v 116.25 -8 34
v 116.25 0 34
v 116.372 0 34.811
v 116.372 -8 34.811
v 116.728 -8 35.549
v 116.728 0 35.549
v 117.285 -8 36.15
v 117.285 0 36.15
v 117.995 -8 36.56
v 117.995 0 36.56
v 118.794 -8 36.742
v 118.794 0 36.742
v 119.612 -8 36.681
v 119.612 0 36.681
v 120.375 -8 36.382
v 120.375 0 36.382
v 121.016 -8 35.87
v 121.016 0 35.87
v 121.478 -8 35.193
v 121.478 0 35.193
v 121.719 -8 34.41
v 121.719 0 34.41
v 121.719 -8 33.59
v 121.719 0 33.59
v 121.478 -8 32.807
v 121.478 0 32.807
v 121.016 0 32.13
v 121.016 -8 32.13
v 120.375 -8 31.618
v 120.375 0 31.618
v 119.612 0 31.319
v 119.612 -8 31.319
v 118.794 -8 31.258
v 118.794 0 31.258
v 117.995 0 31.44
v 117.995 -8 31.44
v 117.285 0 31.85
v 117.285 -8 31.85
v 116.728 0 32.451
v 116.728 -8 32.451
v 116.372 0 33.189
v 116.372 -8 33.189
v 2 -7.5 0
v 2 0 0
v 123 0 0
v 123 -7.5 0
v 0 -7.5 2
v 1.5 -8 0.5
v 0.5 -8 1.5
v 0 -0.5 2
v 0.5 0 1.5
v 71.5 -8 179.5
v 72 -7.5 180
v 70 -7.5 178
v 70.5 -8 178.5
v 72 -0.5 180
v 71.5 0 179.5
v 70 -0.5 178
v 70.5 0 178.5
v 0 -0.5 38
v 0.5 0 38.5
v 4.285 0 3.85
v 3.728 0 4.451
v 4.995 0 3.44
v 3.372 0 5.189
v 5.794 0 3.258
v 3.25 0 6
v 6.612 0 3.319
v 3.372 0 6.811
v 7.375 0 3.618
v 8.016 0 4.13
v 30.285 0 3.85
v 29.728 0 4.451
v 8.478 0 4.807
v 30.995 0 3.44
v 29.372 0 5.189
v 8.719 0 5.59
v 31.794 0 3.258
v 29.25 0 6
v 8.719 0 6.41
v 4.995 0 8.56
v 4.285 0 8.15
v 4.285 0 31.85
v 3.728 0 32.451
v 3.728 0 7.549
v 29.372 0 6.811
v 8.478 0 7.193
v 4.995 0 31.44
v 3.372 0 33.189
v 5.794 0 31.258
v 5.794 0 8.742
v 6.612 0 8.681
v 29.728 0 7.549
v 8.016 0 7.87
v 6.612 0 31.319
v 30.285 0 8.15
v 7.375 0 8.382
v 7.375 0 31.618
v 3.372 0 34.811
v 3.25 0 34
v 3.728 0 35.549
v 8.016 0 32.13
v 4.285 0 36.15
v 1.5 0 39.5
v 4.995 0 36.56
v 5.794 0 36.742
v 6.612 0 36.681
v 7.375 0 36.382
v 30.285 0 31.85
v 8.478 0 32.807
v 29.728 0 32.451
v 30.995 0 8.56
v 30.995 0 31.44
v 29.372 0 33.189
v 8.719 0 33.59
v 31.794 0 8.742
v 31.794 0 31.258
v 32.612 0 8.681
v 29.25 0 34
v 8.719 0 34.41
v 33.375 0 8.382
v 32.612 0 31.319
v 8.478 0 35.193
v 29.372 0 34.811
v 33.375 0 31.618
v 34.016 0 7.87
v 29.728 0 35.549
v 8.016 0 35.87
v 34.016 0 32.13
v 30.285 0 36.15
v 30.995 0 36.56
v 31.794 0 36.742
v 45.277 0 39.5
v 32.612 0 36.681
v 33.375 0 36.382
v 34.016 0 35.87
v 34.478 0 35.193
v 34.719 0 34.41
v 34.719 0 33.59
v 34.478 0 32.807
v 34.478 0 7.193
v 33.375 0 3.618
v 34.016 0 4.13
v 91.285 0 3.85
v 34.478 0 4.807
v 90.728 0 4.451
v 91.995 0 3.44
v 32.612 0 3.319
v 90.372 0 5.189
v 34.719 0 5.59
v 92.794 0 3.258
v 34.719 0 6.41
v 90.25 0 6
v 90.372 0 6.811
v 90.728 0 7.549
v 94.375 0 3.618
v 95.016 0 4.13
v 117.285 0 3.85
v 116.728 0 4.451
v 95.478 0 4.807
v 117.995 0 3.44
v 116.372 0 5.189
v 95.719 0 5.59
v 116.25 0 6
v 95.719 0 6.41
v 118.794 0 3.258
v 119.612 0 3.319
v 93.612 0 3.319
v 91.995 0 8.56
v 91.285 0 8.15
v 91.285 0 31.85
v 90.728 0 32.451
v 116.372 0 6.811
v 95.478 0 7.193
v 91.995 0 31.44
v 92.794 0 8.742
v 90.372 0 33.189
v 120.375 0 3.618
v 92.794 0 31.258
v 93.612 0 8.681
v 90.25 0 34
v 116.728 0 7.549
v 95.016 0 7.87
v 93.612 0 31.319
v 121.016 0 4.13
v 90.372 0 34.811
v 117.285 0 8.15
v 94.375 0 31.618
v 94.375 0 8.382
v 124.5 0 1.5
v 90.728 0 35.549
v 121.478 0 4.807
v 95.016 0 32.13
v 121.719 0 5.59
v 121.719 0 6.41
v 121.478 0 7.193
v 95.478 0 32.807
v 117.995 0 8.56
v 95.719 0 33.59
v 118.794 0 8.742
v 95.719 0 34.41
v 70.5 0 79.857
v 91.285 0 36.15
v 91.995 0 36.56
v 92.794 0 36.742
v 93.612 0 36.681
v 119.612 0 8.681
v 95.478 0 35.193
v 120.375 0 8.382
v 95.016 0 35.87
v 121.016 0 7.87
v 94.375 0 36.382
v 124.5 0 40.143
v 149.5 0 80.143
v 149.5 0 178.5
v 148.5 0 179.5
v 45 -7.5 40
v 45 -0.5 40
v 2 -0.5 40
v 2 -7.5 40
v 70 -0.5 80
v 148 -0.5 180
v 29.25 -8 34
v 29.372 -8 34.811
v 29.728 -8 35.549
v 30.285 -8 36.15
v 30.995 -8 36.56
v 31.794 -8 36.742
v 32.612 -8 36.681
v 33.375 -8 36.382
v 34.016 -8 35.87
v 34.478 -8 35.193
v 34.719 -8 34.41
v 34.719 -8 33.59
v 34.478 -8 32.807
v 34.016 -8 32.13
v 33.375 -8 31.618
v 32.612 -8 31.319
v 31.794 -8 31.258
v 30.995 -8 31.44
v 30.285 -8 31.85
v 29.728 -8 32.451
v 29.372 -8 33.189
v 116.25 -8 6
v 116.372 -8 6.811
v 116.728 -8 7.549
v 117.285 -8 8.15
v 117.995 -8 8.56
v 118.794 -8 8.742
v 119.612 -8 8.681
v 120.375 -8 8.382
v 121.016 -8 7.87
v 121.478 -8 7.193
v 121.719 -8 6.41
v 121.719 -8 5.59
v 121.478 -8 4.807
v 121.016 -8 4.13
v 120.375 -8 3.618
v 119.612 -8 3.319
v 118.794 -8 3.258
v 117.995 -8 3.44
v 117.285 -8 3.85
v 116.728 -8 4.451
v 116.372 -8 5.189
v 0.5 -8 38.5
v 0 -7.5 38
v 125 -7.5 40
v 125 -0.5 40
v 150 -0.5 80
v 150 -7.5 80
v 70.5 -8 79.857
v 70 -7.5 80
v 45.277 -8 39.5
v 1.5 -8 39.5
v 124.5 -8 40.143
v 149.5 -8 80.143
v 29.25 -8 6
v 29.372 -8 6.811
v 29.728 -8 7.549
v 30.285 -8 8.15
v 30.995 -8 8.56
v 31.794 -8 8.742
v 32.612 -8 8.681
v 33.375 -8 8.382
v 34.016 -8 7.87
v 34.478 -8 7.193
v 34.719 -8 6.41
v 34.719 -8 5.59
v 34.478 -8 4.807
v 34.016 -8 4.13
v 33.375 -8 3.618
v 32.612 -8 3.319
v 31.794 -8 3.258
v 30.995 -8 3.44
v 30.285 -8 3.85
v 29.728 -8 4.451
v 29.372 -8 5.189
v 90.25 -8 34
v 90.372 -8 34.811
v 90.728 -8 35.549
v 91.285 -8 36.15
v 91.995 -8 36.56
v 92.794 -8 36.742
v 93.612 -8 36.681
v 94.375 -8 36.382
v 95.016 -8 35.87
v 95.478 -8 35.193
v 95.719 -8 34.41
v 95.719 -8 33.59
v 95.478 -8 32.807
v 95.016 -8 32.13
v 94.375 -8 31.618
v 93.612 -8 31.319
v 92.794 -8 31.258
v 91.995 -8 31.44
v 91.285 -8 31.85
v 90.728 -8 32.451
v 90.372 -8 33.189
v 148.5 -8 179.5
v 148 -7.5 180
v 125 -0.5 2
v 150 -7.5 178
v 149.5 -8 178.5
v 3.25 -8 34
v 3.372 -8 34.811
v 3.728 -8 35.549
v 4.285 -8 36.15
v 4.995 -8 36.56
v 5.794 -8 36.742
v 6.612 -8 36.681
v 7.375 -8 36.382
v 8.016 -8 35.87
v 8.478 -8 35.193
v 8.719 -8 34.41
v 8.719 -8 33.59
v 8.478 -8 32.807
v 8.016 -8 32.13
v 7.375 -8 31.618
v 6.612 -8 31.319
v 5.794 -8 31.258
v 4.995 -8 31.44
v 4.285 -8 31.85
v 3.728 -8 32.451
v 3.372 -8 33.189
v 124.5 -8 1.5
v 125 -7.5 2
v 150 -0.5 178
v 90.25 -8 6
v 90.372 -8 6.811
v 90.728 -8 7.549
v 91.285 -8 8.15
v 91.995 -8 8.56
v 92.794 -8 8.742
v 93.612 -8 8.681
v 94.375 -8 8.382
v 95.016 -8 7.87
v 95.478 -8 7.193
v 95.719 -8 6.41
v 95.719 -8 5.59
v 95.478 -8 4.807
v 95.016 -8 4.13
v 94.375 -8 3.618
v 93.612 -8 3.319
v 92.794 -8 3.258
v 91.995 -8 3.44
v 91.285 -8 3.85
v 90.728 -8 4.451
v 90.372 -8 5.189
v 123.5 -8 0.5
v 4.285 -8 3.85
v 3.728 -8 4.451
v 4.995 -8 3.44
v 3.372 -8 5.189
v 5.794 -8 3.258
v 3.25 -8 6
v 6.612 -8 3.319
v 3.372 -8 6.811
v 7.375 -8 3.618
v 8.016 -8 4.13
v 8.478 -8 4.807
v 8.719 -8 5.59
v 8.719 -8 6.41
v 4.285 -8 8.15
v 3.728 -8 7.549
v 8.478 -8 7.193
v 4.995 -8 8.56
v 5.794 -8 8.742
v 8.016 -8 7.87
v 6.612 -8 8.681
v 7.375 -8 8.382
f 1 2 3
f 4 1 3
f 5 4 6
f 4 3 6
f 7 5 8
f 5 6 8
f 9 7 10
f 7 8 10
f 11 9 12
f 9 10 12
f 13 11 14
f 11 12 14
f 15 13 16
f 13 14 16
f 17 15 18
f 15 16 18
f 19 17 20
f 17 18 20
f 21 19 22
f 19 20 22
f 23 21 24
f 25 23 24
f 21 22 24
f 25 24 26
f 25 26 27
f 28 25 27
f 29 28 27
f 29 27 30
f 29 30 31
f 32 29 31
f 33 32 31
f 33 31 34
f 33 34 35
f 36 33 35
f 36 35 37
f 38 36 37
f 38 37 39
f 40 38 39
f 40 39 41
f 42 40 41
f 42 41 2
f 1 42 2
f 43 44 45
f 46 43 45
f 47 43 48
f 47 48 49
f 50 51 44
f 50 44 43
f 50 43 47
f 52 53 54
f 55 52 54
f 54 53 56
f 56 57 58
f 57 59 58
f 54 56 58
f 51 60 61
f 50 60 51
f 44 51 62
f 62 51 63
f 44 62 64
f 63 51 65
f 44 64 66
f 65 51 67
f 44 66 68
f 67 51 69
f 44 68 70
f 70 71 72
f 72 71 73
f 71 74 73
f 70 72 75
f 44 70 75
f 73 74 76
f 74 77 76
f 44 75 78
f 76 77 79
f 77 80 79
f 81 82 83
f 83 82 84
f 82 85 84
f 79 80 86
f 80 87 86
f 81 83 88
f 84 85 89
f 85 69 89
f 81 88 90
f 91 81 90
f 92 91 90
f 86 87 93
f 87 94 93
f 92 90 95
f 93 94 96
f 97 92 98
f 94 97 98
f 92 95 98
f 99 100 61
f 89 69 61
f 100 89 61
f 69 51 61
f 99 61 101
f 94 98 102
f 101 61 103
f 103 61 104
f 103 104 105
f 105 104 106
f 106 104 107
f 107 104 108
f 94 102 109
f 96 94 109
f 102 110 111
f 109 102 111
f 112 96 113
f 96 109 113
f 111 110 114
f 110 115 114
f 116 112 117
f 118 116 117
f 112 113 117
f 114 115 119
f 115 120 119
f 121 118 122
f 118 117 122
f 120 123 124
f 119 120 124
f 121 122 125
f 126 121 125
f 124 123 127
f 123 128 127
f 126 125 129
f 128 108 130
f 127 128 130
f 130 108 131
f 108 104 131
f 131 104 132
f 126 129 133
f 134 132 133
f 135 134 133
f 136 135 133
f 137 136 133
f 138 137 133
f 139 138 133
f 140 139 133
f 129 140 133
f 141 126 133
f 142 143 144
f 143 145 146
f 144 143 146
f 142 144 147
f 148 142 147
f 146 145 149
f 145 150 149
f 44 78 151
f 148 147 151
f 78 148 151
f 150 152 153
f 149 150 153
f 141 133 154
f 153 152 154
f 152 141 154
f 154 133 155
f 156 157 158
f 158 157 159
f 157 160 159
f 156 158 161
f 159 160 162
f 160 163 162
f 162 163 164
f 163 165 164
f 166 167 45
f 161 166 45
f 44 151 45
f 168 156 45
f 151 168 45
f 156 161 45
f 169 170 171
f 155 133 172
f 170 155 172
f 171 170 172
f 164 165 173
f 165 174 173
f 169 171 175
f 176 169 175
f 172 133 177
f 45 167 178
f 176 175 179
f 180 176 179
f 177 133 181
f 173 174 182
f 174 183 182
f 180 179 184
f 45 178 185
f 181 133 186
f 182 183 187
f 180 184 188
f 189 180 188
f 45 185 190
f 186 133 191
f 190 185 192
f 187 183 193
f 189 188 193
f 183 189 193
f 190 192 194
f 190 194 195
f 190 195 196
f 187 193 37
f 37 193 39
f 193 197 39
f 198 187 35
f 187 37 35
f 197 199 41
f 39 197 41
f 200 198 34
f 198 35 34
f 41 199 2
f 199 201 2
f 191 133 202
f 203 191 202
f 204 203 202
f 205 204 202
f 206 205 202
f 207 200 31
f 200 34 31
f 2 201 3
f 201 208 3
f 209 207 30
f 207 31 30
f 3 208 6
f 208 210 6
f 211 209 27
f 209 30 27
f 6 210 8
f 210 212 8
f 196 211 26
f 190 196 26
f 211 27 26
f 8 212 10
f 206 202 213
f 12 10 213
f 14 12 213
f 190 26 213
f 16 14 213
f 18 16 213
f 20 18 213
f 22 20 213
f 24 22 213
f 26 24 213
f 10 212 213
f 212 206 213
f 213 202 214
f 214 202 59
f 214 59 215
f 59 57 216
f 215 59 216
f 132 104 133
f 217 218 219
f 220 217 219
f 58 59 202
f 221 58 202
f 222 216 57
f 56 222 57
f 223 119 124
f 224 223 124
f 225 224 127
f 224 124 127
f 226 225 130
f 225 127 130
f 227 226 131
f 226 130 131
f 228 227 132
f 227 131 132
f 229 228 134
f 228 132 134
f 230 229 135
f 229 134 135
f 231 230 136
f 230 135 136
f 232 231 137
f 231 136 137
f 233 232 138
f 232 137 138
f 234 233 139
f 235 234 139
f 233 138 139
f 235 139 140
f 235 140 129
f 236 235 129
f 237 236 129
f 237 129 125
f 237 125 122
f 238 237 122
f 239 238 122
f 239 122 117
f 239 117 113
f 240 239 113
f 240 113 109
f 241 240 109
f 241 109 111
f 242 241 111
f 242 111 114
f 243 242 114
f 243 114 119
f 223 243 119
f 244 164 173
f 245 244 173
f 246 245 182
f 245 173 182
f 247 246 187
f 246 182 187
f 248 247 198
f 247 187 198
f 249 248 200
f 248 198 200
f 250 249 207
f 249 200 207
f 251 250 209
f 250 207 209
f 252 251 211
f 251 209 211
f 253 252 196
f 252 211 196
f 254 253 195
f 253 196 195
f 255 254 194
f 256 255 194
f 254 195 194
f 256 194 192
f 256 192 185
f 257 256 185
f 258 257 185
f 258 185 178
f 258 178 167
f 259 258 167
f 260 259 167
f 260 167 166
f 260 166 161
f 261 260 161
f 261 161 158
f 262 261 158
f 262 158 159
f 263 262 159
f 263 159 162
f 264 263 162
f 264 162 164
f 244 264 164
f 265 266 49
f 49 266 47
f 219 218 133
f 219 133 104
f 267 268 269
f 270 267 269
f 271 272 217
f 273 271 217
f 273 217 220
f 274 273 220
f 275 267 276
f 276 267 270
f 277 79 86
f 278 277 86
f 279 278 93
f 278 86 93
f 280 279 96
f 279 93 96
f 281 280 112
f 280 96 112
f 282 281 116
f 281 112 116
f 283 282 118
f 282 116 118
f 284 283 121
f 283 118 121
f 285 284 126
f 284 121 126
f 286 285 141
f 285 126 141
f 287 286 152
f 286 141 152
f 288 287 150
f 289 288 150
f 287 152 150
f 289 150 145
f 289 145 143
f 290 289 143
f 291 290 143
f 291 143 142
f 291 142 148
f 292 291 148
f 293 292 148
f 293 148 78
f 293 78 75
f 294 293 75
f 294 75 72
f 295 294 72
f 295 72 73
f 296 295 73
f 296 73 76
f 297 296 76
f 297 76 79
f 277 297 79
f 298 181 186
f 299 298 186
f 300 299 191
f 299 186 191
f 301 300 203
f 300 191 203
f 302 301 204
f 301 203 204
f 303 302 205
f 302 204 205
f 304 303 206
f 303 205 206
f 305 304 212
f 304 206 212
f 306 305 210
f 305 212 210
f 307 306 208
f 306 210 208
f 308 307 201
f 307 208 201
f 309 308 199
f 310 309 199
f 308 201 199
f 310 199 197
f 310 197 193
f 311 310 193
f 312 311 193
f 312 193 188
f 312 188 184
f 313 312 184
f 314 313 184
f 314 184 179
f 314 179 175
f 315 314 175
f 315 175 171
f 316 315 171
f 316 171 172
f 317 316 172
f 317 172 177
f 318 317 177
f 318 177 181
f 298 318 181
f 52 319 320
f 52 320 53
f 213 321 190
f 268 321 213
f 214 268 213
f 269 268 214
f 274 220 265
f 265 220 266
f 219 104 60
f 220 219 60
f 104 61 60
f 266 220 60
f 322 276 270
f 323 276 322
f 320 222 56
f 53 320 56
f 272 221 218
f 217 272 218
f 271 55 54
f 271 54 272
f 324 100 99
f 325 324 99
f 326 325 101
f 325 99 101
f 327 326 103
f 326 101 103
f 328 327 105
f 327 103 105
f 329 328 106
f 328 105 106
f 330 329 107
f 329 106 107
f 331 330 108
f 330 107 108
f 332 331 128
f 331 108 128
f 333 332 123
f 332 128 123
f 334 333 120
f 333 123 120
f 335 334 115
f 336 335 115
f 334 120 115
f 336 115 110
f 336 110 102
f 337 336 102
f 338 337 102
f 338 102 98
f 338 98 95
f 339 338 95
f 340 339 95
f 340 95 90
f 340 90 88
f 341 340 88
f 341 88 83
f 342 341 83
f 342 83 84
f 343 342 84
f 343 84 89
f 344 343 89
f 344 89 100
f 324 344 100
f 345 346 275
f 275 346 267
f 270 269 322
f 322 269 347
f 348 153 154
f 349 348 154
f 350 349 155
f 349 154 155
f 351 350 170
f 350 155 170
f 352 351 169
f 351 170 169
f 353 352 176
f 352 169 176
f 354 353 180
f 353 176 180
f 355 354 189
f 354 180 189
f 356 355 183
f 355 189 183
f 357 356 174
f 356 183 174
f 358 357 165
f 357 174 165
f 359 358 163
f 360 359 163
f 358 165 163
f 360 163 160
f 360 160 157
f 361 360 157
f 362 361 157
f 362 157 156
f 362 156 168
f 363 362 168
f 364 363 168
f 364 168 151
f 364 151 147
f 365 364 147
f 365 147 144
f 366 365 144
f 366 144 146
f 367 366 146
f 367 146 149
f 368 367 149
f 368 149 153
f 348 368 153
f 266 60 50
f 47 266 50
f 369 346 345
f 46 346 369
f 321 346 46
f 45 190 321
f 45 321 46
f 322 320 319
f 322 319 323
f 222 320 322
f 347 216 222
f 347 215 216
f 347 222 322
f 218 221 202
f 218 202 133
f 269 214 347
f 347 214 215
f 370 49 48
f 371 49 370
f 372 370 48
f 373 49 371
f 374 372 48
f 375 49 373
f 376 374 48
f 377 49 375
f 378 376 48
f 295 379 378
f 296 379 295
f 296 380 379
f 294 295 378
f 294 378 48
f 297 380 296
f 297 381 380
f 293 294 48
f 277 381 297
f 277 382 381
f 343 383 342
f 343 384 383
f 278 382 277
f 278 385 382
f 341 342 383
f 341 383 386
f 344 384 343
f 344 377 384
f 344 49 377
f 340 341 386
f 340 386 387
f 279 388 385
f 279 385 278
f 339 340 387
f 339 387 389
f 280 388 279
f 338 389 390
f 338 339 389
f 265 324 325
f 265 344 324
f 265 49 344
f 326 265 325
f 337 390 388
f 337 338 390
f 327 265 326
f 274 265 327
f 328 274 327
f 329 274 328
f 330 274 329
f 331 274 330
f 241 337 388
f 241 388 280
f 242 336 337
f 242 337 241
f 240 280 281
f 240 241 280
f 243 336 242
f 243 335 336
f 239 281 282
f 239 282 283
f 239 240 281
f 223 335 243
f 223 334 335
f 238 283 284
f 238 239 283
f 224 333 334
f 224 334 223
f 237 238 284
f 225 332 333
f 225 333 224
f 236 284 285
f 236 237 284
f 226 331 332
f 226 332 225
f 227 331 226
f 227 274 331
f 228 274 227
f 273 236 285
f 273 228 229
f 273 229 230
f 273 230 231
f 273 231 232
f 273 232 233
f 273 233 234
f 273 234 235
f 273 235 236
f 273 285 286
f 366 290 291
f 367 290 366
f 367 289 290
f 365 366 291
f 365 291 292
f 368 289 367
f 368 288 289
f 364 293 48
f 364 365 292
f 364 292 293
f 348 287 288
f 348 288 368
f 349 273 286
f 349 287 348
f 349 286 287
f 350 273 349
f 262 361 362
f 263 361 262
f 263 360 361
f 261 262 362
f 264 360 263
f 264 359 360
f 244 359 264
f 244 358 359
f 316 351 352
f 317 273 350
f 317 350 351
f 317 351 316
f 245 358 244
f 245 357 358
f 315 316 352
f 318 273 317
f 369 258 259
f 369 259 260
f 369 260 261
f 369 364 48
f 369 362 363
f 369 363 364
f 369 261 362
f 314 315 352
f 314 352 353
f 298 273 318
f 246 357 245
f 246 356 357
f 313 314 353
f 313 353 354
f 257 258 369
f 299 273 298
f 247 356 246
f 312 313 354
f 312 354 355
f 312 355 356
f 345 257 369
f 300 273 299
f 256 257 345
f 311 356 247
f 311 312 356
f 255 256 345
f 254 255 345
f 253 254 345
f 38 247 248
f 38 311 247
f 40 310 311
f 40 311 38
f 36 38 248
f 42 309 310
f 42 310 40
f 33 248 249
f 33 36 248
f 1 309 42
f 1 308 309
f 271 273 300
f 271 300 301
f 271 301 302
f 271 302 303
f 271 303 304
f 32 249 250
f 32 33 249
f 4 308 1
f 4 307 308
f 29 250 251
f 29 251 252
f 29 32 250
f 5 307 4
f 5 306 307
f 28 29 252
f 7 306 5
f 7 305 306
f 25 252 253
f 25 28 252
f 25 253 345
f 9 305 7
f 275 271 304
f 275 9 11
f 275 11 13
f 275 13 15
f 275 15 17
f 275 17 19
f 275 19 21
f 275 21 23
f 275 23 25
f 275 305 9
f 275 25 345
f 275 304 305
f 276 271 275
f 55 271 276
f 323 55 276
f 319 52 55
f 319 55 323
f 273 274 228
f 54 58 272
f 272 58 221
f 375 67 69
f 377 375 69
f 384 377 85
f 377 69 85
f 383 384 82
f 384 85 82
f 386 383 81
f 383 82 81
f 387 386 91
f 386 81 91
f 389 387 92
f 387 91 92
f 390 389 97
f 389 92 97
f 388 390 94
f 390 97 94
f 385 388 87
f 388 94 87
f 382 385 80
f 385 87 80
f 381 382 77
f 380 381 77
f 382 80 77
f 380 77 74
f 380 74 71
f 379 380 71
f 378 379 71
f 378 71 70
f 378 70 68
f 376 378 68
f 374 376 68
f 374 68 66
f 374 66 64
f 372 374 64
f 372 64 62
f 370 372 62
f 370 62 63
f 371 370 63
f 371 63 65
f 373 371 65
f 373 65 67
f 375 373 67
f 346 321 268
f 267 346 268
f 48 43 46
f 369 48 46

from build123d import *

# Parameters (mm, degrees)
F1_DEPTH    = 8
F3_D        = 5.5
F4_SIZE     = 0.5
F5_T1_DEPTH = 17.2867319519


# Not quite as in the source:
# - a fillet or chamfer that OpenCascade refuses, or shapes differently, is made with other operations: its cross-section is extruded or revolved along the edge and cut away or added


with BuildPart() as f1:
    # F0 (on Front) → F1 (new body)
    with BuildSketch(Plane.XZ):
        Polygon((150, 180), (70, 180), (70, 80), (45, 40), (0, 40), (0, 0), (125, 0), (125, 40), (150, 80), align=None)
    extrude(amount=F1_DEPTH)

    # F3 (through all)
    with Locations(Plane.XZ.offset(8)):
        with Locations((93, 34), (6, 34), (32, 34), (119, 34), (119, 6), (93, 6), (32, 6), (6, 6)):
            Hole(F3_D / 2)

    # F4
    f4_edges = [f1.edges().sort_by_distance(p)[0] for p in [
        (110, -8, 180),
        (70, -8, 130),
        (57.5, -8, 60),
        (22.5, -8, 40),
        (0, -8, 20),
        (62.5, -8, 0),
        (125, -8, 20),
        (137.5, -8, 60),
        (150, -8, 130),
        (110, 0, 180),
        (150, 0, 130),
        (137.5, 0, 60),
        (125, 0, 20),
        (0, 0, 20),
        (22.5, 0, 40),
        (57.5, 0, 60),
        (70, 0, 130),
    ]]
    chamfer(f4_edges, length=F4_SIZE)

    # F5: chamfer of 2 on 5 edges, made by hand

    # F5_s2 → F5_t1 (cut)
    with BuildSketch(Plane.XZ.offset(-4.6433659759)):
        Polygon((72, 180), (70, 178), (70, 180), align=None)
        Polygon((148, 180), (150, 178), (150, 180), align=None)
        Polygon((2, 40), (0, 38), (0, 40), align=None)
        Polygon((2, 0), (0, 2), (0, 0), align=None)
        Polygon((125, 2), (123, 0), (125, 0), align=None)
    extrude(amount=F5_T1_DEPTH, mode=Mode.SUBTRACT)


solid = f1.part
